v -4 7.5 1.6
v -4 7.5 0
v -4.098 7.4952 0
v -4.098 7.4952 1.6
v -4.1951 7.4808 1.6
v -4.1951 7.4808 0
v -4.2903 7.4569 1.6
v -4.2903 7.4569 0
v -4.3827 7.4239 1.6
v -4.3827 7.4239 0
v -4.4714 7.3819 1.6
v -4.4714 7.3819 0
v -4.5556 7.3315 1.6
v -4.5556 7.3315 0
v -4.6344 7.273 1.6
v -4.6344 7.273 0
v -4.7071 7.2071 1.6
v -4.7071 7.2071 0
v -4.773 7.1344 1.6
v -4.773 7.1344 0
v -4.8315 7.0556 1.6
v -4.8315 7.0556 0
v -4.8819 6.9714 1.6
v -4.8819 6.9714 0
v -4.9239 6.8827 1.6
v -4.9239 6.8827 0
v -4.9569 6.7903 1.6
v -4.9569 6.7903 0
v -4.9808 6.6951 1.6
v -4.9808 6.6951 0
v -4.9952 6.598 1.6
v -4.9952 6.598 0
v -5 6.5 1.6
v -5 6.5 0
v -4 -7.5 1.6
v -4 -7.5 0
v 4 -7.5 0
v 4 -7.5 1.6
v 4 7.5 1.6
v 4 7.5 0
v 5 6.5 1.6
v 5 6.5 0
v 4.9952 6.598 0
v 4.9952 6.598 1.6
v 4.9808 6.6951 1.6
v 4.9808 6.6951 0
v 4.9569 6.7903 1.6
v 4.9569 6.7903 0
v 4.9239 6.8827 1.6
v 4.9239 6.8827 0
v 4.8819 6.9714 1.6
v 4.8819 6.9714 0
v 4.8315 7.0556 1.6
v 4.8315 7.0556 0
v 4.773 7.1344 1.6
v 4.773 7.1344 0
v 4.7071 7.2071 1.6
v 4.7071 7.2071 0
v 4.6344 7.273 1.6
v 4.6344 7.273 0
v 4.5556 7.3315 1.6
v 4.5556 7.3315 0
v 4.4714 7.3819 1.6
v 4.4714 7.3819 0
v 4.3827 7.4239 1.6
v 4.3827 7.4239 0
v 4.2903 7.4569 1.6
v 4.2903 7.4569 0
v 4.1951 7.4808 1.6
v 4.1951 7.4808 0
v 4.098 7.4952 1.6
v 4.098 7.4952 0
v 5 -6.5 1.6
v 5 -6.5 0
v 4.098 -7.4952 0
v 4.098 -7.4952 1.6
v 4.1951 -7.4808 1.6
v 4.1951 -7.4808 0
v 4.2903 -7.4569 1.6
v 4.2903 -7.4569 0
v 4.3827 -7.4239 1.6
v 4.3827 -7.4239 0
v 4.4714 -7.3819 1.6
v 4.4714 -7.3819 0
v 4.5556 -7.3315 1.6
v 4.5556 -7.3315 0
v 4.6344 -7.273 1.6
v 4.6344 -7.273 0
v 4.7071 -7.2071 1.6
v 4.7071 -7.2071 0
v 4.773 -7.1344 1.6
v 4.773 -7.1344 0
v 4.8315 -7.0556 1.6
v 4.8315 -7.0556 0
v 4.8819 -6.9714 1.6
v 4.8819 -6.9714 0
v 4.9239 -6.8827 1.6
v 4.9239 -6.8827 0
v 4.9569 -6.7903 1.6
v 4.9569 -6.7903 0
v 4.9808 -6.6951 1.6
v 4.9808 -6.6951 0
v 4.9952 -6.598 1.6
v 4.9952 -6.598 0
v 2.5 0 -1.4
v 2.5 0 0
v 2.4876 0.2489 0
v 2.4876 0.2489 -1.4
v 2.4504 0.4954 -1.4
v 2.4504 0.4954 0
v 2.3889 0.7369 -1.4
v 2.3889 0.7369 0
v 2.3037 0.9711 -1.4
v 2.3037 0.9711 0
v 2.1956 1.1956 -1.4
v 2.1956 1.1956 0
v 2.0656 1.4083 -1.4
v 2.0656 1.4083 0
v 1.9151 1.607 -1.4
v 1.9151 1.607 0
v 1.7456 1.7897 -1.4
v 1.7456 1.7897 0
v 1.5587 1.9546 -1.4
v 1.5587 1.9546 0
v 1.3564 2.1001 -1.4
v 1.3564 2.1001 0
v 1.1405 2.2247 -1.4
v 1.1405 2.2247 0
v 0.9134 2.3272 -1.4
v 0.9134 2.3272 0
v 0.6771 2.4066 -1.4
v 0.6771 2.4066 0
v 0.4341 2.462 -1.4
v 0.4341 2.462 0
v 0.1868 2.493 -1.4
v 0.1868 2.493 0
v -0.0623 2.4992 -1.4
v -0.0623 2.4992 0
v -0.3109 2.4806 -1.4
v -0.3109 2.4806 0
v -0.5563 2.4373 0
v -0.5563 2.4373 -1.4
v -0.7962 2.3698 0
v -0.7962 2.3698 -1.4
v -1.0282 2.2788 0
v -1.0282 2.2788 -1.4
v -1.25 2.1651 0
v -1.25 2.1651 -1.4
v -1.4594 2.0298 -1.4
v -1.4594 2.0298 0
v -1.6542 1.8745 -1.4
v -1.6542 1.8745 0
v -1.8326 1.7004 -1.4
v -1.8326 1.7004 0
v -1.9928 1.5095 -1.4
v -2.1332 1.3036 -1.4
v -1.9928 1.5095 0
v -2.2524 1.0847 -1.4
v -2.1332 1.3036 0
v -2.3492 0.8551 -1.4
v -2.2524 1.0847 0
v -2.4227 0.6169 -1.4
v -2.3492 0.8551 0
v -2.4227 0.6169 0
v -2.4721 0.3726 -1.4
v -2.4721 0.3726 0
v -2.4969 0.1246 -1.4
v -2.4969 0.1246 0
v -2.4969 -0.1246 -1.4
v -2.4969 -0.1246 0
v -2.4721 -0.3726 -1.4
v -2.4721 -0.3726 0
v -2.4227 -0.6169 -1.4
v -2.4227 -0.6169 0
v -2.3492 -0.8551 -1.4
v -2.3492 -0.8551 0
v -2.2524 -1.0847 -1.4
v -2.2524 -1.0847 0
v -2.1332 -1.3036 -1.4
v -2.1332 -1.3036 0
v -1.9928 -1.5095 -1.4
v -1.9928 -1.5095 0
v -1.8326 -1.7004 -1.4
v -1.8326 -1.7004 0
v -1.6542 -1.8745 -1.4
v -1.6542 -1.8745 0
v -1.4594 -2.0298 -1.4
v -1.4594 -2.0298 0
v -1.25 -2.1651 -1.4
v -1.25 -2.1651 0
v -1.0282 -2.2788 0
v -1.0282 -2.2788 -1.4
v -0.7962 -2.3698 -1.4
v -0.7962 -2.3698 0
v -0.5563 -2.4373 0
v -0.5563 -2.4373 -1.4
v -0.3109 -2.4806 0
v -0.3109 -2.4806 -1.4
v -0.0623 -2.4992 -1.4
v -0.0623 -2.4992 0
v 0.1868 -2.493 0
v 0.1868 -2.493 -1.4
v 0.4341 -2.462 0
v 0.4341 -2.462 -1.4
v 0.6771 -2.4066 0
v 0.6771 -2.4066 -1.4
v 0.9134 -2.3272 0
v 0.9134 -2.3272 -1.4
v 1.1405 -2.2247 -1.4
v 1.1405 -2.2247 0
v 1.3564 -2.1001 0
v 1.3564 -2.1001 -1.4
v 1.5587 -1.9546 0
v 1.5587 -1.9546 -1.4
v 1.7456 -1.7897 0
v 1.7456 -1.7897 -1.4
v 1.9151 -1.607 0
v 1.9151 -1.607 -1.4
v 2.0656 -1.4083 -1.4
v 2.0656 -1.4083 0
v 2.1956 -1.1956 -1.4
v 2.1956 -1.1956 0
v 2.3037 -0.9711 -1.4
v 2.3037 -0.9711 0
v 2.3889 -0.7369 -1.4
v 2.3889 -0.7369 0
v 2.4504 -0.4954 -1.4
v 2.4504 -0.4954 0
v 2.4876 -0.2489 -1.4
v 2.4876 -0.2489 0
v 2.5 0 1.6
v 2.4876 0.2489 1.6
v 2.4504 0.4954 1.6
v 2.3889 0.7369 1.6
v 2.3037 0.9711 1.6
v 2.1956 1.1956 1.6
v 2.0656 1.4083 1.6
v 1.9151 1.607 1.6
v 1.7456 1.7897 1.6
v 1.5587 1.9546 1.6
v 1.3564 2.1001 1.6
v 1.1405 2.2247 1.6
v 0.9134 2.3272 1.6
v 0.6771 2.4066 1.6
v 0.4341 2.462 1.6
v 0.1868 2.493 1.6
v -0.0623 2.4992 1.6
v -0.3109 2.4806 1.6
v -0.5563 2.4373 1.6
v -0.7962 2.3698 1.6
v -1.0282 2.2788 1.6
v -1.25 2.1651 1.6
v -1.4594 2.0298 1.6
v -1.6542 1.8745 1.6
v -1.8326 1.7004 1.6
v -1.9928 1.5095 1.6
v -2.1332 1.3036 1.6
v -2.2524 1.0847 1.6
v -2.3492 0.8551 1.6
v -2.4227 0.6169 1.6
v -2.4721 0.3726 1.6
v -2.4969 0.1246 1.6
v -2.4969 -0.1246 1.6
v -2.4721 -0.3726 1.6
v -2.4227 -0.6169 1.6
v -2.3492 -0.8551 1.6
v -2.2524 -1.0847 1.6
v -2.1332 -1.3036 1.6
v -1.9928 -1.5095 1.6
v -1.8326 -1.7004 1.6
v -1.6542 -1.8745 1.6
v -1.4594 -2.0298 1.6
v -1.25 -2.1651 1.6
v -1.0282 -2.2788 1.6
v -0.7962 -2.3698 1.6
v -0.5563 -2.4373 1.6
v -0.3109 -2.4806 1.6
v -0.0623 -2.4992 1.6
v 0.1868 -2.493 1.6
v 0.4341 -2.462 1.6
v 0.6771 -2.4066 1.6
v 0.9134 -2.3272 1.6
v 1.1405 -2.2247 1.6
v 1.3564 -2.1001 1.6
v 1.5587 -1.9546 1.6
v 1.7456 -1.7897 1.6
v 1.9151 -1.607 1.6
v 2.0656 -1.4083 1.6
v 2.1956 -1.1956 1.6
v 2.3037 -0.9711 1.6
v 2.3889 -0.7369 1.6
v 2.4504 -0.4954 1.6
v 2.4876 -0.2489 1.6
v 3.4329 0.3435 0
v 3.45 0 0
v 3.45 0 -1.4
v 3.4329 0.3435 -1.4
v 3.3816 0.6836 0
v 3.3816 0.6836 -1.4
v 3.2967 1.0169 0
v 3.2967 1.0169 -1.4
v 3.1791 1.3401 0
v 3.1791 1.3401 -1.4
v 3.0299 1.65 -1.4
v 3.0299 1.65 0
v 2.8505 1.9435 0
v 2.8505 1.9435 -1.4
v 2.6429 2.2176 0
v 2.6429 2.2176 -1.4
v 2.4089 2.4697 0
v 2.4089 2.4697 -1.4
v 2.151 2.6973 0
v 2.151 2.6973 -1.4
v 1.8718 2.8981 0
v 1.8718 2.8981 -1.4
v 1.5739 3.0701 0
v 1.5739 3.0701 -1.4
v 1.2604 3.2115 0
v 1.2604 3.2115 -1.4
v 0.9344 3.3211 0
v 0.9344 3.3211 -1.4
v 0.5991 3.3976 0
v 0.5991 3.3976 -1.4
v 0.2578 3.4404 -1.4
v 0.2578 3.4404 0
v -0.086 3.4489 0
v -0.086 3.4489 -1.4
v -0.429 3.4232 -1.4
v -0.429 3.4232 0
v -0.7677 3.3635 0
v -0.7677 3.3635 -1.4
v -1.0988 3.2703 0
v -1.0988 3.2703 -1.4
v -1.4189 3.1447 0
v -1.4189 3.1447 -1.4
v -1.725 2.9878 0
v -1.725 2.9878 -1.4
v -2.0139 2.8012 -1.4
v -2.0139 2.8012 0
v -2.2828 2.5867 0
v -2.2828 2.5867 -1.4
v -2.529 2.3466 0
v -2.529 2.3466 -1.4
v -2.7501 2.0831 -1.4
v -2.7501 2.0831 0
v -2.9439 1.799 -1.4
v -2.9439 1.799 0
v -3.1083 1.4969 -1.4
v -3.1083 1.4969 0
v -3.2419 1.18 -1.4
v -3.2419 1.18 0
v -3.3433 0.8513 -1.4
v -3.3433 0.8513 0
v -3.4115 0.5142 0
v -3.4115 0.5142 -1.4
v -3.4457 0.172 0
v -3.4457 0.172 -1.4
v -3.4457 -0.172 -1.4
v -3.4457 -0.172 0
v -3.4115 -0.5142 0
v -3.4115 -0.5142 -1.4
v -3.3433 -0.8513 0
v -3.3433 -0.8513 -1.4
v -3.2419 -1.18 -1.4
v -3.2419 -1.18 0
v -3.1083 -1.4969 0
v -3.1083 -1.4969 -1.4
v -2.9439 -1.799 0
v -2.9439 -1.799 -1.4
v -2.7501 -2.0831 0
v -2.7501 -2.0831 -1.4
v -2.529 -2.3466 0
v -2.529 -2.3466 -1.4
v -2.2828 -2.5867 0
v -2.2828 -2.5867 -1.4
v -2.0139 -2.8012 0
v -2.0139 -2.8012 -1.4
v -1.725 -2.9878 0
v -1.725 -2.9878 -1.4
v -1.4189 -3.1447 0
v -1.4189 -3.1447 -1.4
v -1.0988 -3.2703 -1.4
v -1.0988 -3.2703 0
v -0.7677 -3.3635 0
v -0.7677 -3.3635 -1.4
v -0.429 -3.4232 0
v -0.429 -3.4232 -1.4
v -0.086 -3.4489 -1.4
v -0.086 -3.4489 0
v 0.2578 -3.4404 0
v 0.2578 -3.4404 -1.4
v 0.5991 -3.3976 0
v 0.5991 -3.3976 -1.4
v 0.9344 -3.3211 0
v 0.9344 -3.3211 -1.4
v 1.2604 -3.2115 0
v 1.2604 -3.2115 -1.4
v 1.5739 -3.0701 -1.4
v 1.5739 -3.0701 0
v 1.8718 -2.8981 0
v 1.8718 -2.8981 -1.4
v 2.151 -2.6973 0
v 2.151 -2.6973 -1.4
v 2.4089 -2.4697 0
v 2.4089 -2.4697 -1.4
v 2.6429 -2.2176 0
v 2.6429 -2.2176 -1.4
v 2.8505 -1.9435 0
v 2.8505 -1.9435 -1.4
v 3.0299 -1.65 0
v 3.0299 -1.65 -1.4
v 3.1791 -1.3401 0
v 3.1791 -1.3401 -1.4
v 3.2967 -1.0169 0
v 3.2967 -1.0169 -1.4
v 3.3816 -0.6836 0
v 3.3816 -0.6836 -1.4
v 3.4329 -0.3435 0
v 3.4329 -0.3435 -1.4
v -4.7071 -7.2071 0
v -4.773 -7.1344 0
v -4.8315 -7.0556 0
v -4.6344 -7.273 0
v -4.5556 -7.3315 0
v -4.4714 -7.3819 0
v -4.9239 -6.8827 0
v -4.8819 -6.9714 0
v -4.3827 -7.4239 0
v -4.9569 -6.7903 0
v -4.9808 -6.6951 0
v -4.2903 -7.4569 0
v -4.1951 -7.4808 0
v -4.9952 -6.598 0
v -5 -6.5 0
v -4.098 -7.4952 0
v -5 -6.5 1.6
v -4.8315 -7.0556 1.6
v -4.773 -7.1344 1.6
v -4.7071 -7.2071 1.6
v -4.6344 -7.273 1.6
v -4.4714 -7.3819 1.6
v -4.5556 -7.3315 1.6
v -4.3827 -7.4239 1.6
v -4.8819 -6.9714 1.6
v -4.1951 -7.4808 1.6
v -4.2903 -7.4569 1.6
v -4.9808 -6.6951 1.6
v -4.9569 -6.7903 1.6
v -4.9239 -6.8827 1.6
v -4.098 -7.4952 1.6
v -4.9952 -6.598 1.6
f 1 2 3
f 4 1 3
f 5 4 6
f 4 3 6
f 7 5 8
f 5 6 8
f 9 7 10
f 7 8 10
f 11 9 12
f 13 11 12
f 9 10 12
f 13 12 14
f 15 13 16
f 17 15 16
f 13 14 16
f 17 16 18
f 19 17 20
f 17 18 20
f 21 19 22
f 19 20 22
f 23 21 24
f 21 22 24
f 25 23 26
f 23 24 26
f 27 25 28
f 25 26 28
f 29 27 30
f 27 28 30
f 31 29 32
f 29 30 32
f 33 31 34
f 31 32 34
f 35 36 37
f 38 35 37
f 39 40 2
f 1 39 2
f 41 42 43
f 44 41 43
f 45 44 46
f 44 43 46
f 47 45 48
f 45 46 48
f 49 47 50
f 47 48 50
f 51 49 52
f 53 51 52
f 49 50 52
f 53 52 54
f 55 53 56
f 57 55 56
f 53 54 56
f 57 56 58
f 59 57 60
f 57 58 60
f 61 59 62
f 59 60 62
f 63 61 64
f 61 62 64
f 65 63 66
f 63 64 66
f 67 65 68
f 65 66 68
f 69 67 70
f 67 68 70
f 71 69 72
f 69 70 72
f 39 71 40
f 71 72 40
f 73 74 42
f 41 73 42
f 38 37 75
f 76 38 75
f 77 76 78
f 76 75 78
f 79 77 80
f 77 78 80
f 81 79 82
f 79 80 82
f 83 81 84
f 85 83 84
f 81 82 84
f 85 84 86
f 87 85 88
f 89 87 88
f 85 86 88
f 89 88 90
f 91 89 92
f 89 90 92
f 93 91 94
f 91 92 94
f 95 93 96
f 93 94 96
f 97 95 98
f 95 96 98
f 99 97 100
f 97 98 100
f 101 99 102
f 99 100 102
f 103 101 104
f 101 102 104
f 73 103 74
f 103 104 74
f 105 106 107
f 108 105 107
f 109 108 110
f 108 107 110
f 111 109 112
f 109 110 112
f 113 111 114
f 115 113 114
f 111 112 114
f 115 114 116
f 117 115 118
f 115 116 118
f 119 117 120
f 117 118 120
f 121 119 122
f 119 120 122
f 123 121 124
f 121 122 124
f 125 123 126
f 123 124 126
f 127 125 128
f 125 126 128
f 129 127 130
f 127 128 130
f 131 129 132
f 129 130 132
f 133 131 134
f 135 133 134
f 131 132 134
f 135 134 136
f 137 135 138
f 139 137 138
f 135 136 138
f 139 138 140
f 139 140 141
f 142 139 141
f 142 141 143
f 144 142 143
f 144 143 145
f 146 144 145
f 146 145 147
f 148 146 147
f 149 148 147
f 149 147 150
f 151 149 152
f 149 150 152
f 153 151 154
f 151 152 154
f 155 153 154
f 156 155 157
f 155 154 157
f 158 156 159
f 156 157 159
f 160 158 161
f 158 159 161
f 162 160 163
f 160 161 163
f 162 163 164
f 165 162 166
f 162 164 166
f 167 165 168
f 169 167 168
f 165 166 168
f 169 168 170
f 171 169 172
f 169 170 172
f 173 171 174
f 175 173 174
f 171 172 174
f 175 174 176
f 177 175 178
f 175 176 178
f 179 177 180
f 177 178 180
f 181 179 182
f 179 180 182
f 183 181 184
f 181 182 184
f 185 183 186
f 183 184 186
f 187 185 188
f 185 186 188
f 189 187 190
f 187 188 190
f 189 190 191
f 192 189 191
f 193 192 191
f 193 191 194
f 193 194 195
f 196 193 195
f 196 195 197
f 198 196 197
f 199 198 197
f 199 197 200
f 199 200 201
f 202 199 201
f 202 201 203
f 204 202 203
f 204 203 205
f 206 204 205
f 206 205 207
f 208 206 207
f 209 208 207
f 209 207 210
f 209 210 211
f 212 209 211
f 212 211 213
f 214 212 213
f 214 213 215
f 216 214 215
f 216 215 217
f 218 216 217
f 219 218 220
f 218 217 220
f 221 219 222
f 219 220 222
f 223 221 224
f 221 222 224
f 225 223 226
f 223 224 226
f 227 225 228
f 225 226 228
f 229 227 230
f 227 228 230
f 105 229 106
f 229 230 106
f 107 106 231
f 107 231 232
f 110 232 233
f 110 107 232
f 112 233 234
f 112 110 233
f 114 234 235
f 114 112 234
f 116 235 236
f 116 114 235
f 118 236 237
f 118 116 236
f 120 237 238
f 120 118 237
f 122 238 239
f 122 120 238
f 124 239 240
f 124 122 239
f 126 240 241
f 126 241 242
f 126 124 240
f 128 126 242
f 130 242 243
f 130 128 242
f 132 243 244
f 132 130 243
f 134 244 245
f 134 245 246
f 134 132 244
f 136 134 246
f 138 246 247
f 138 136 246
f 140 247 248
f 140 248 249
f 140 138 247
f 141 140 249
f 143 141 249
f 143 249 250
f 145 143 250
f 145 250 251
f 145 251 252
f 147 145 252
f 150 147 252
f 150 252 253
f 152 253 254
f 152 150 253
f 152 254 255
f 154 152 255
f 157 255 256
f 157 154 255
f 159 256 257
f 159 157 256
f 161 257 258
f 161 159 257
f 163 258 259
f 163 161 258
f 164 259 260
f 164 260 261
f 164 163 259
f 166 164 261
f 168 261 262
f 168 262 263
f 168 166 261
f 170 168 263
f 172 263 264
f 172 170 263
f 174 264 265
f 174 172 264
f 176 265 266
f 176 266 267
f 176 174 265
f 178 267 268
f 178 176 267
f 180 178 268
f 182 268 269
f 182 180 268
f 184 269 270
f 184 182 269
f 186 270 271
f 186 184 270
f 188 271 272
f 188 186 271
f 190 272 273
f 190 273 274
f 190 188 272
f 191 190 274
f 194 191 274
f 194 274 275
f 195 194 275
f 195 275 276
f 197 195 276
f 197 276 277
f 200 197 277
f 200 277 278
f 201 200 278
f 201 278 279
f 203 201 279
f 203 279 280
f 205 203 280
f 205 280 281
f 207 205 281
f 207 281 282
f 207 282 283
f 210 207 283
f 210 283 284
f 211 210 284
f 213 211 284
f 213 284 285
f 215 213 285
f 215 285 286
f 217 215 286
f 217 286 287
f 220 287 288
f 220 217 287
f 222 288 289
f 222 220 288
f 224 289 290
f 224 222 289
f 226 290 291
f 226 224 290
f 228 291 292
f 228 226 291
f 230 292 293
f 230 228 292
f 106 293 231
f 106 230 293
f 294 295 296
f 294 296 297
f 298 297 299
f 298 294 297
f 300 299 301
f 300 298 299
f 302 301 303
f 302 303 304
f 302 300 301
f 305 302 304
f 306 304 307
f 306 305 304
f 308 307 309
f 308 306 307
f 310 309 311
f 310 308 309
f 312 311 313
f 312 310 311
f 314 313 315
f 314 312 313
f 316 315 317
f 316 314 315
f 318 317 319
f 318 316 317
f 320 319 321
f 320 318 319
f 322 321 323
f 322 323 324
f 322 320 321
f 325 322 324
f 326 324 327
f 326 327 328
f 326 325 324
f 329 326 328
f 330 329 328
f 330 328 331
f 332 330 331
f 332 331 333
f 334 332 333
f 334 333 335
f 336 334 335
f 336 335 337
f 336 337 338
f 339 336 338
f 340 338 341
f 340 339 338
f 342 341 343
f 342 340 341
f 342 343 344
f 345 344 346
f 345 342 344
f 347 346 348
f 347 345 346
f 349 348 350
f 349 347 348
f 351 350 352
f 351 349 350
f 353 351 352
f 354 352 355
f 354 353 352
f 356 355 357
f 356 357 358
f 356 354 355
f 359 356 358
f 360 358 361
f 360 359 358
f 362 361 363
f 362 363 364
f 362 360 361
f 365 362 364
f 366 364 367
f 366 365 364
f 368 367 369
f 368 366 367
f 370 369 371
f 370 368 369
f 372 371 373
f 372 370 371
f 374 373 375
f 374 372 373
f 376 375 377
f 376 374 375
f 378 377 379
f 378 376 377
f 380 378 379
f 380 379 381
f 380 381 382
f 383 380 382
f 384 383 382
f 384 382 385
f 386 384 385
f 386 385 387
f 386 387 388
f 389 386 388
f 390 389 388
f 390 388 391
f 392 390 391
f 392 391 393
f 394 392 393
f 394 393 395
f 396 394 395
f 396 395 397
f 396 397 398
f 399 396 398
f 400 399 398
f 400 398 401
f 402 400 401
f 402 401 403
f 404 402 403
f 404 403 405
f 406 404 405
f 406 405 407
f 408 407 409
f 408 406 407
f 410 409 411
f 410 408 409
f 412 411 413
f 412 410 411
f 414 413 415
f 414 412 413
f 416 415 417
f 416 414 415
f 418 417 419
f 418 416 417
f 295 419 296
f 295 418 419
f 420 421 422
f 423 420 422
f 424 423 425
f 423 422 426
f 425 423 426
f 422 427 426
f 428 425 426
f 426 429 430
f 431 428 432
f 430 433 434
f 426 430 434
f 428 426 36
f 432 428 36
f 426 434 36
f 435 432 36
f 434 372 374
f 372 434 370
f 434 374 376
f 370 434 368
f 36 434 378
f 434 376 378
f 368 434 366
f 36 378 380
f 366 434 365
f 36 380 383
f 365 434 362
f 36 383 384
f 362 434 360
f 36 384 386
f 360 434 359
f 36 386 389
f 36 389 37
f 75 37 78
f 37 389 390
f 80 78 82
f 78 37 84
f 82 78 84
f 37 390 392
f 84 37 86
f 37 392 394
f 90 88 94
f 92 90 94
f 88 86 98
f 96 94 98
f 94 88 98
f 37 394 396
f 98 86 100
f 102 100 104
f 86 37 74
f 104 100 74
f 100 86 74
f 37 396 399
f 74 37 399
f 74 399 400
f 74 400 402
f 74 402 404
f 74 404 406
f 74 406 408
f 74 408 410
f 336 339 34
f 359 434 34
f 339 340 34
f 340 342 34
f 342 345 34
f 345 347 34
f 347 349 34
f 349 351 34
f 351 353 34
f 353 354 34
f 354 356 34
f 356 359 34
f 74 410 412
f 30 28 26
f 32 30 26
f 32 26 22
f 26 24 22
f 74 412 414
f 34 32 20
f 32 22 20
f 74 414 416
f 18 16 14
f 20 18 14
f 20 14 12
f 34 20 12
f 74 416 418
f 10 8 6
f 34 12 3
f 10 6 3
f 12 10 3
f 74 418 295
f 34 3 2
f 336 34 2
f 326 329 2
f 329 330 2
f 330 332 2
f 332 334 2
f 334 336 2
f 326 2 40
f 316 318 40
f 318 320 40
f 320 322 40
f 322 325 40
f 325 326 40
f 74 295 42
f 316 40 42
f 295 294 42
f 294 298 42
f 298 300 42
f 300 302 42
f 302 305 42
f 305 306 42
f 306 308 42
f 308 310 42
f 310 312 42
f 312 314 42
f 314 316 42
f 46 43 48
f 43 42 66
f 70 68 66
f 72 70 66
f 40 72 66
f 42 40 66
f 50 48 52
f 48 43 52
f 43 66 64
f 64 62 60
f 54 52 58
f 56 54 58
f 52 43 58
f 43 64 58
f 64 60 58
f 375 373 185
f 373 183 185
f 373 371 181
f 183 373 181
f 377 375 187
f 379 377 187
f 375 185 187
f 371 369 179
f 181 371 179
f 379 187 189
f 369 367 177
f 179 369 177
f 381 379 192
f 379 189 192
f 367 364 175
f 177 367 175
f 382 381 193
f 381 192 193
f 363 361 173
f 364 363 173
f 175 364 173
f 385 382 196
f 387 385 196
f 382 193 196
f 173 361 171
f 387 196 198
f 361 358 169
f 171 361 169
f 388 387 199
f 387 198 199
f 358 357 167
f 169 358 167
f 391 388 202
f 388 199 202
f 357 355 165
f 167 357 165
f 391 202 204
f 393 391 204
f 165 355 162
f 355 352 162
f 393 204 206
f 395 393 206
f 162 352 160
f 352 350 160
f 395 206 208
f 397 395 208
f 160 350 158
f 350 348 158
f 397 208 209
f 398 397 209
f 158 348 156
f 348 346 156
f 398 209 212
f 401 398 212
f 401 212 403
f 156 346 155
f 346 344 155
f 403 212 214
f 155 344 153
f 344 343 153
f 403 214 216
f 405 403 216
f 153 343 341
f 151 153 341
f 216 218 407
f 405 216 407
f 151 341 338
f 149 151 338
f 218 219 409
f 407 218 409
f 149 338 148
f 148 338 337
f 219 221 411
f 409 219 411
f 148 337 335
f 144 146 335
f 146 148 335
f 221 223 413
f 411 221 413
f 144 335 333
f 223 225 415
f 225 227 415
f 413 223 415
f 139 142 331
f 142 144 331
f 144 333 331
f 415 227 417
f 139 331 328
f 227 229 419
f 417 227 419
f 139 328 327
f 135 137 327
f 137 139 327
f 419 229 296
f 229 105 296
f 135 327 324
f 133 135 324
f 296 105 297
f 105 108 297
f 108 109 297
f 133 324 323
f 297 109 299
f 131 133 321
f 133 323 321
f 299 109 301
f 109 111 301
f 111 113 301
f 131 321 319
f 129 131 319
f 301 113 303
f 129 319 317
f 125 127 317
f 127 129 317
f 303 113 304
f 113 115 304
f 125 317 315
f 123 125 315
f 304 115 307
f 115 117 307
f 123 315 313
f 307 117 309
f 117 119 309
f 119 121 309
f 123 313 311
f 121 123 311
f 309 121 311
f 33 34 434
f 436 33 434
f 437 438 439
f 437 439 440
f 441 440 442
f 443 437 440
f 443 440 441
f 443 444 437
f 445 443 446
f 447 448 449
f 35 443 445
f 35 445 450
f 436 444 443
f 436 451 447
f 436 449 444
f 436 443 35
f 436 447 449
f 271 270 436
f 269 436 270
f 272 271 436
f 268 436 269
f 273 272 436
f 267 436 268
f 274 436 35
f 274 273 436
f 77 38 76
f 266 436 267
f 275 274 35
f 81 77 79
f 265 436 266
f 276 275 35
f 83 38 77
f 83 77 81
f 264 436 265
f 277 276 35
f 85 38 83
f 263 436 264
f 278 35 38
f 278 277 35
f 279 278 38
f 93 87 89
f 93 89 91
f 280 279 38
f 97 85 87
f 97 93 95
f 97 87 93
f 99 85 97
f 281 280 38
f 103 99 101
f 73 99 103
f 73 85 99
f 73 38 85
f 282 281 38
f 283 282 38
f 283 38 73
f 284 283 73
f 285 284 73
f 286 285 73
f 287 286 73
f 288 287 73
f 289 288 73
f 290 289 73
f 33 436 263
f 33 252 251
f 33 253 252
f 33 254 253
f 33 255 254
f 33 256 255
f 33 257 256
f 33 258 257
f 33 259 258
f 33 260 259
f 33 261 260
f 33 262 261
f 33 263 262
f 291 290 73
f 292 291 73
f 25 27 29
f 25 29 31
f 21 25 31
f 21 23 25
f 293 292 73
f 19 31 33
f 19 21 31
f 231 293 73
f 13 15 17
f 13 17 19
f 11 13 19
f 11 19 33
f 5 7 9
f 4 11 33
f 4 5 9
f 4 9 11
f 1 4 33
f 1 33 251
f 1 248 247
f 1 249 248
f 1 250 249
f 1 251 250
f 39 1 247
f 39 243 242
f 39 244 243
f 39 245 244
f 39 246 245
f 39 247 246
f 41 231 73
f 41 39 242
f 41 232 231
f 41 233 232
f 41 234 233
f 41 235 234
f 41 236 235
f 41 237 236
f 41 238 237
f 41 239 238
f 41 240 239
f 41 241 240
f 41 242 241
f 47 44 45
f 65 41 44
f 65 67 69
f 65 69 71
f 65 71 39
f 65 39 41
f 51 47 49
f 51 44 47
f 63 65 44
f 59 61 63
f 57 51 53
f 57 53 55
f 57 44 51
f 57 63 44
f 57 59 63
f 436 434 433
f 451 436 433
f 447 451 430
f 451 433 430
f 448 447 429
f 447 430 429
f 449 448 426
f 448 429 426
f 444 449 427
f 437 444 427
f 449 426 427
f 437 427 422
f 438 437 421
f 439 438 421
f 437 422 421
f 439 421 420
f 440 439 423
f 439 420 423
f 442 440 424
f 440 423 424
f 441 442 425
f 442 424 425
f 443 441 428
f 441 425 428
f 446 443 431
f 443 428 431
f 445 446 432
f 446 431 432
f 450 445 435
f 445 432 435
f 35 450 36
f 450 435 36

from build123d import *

# Parameters (mm, degrees)
F0_R     = 2.5
F1_DEPTH = 1.6
F2_R     = 3.45
F2_R_2   = 2.5
F3_DEPTH = 1.4


with BuildPart() as f1:
    # F0 (on Top) → F1 (new body)
    with BuildSketch(Plane.XY):
        with BuildLine():
            Line((-4, -7.5), (4, -7.5))
            ThreePointArc((4, -7.5), (4.707107, -7.207107), (5, -6.5))
            Line((5, -6.5), (5, 6.5))
            ThreePointArc((5, 6.5), (4.707107, 7.207107), (4, 7.5))
            Line((4, 7.5), (-4, 7.5))
            ThreePointArc((-4, 7.5), (-4.707107, 7.207107), (-5, 6.5))
            Line((-5, 6.5), (-5, -6.5))
            ThreePointArc((-5, -6.5), (-4.707107, -7.207107), (-4, -7.5))
        make_face()
        Circle(F0_R, mode=Mode.SUBTRACT)
    extrude(amount=F1_DEPTH)

    # F2 (on Top) → F3 (join)
    with BuildSketch(Plane.XY):
        Circle(F2_R)
        Circle(F2_R_2, mode=Mode.SUBTRACT)
    extrude(amount=-F3_DEPTH)


solid = f1.part
